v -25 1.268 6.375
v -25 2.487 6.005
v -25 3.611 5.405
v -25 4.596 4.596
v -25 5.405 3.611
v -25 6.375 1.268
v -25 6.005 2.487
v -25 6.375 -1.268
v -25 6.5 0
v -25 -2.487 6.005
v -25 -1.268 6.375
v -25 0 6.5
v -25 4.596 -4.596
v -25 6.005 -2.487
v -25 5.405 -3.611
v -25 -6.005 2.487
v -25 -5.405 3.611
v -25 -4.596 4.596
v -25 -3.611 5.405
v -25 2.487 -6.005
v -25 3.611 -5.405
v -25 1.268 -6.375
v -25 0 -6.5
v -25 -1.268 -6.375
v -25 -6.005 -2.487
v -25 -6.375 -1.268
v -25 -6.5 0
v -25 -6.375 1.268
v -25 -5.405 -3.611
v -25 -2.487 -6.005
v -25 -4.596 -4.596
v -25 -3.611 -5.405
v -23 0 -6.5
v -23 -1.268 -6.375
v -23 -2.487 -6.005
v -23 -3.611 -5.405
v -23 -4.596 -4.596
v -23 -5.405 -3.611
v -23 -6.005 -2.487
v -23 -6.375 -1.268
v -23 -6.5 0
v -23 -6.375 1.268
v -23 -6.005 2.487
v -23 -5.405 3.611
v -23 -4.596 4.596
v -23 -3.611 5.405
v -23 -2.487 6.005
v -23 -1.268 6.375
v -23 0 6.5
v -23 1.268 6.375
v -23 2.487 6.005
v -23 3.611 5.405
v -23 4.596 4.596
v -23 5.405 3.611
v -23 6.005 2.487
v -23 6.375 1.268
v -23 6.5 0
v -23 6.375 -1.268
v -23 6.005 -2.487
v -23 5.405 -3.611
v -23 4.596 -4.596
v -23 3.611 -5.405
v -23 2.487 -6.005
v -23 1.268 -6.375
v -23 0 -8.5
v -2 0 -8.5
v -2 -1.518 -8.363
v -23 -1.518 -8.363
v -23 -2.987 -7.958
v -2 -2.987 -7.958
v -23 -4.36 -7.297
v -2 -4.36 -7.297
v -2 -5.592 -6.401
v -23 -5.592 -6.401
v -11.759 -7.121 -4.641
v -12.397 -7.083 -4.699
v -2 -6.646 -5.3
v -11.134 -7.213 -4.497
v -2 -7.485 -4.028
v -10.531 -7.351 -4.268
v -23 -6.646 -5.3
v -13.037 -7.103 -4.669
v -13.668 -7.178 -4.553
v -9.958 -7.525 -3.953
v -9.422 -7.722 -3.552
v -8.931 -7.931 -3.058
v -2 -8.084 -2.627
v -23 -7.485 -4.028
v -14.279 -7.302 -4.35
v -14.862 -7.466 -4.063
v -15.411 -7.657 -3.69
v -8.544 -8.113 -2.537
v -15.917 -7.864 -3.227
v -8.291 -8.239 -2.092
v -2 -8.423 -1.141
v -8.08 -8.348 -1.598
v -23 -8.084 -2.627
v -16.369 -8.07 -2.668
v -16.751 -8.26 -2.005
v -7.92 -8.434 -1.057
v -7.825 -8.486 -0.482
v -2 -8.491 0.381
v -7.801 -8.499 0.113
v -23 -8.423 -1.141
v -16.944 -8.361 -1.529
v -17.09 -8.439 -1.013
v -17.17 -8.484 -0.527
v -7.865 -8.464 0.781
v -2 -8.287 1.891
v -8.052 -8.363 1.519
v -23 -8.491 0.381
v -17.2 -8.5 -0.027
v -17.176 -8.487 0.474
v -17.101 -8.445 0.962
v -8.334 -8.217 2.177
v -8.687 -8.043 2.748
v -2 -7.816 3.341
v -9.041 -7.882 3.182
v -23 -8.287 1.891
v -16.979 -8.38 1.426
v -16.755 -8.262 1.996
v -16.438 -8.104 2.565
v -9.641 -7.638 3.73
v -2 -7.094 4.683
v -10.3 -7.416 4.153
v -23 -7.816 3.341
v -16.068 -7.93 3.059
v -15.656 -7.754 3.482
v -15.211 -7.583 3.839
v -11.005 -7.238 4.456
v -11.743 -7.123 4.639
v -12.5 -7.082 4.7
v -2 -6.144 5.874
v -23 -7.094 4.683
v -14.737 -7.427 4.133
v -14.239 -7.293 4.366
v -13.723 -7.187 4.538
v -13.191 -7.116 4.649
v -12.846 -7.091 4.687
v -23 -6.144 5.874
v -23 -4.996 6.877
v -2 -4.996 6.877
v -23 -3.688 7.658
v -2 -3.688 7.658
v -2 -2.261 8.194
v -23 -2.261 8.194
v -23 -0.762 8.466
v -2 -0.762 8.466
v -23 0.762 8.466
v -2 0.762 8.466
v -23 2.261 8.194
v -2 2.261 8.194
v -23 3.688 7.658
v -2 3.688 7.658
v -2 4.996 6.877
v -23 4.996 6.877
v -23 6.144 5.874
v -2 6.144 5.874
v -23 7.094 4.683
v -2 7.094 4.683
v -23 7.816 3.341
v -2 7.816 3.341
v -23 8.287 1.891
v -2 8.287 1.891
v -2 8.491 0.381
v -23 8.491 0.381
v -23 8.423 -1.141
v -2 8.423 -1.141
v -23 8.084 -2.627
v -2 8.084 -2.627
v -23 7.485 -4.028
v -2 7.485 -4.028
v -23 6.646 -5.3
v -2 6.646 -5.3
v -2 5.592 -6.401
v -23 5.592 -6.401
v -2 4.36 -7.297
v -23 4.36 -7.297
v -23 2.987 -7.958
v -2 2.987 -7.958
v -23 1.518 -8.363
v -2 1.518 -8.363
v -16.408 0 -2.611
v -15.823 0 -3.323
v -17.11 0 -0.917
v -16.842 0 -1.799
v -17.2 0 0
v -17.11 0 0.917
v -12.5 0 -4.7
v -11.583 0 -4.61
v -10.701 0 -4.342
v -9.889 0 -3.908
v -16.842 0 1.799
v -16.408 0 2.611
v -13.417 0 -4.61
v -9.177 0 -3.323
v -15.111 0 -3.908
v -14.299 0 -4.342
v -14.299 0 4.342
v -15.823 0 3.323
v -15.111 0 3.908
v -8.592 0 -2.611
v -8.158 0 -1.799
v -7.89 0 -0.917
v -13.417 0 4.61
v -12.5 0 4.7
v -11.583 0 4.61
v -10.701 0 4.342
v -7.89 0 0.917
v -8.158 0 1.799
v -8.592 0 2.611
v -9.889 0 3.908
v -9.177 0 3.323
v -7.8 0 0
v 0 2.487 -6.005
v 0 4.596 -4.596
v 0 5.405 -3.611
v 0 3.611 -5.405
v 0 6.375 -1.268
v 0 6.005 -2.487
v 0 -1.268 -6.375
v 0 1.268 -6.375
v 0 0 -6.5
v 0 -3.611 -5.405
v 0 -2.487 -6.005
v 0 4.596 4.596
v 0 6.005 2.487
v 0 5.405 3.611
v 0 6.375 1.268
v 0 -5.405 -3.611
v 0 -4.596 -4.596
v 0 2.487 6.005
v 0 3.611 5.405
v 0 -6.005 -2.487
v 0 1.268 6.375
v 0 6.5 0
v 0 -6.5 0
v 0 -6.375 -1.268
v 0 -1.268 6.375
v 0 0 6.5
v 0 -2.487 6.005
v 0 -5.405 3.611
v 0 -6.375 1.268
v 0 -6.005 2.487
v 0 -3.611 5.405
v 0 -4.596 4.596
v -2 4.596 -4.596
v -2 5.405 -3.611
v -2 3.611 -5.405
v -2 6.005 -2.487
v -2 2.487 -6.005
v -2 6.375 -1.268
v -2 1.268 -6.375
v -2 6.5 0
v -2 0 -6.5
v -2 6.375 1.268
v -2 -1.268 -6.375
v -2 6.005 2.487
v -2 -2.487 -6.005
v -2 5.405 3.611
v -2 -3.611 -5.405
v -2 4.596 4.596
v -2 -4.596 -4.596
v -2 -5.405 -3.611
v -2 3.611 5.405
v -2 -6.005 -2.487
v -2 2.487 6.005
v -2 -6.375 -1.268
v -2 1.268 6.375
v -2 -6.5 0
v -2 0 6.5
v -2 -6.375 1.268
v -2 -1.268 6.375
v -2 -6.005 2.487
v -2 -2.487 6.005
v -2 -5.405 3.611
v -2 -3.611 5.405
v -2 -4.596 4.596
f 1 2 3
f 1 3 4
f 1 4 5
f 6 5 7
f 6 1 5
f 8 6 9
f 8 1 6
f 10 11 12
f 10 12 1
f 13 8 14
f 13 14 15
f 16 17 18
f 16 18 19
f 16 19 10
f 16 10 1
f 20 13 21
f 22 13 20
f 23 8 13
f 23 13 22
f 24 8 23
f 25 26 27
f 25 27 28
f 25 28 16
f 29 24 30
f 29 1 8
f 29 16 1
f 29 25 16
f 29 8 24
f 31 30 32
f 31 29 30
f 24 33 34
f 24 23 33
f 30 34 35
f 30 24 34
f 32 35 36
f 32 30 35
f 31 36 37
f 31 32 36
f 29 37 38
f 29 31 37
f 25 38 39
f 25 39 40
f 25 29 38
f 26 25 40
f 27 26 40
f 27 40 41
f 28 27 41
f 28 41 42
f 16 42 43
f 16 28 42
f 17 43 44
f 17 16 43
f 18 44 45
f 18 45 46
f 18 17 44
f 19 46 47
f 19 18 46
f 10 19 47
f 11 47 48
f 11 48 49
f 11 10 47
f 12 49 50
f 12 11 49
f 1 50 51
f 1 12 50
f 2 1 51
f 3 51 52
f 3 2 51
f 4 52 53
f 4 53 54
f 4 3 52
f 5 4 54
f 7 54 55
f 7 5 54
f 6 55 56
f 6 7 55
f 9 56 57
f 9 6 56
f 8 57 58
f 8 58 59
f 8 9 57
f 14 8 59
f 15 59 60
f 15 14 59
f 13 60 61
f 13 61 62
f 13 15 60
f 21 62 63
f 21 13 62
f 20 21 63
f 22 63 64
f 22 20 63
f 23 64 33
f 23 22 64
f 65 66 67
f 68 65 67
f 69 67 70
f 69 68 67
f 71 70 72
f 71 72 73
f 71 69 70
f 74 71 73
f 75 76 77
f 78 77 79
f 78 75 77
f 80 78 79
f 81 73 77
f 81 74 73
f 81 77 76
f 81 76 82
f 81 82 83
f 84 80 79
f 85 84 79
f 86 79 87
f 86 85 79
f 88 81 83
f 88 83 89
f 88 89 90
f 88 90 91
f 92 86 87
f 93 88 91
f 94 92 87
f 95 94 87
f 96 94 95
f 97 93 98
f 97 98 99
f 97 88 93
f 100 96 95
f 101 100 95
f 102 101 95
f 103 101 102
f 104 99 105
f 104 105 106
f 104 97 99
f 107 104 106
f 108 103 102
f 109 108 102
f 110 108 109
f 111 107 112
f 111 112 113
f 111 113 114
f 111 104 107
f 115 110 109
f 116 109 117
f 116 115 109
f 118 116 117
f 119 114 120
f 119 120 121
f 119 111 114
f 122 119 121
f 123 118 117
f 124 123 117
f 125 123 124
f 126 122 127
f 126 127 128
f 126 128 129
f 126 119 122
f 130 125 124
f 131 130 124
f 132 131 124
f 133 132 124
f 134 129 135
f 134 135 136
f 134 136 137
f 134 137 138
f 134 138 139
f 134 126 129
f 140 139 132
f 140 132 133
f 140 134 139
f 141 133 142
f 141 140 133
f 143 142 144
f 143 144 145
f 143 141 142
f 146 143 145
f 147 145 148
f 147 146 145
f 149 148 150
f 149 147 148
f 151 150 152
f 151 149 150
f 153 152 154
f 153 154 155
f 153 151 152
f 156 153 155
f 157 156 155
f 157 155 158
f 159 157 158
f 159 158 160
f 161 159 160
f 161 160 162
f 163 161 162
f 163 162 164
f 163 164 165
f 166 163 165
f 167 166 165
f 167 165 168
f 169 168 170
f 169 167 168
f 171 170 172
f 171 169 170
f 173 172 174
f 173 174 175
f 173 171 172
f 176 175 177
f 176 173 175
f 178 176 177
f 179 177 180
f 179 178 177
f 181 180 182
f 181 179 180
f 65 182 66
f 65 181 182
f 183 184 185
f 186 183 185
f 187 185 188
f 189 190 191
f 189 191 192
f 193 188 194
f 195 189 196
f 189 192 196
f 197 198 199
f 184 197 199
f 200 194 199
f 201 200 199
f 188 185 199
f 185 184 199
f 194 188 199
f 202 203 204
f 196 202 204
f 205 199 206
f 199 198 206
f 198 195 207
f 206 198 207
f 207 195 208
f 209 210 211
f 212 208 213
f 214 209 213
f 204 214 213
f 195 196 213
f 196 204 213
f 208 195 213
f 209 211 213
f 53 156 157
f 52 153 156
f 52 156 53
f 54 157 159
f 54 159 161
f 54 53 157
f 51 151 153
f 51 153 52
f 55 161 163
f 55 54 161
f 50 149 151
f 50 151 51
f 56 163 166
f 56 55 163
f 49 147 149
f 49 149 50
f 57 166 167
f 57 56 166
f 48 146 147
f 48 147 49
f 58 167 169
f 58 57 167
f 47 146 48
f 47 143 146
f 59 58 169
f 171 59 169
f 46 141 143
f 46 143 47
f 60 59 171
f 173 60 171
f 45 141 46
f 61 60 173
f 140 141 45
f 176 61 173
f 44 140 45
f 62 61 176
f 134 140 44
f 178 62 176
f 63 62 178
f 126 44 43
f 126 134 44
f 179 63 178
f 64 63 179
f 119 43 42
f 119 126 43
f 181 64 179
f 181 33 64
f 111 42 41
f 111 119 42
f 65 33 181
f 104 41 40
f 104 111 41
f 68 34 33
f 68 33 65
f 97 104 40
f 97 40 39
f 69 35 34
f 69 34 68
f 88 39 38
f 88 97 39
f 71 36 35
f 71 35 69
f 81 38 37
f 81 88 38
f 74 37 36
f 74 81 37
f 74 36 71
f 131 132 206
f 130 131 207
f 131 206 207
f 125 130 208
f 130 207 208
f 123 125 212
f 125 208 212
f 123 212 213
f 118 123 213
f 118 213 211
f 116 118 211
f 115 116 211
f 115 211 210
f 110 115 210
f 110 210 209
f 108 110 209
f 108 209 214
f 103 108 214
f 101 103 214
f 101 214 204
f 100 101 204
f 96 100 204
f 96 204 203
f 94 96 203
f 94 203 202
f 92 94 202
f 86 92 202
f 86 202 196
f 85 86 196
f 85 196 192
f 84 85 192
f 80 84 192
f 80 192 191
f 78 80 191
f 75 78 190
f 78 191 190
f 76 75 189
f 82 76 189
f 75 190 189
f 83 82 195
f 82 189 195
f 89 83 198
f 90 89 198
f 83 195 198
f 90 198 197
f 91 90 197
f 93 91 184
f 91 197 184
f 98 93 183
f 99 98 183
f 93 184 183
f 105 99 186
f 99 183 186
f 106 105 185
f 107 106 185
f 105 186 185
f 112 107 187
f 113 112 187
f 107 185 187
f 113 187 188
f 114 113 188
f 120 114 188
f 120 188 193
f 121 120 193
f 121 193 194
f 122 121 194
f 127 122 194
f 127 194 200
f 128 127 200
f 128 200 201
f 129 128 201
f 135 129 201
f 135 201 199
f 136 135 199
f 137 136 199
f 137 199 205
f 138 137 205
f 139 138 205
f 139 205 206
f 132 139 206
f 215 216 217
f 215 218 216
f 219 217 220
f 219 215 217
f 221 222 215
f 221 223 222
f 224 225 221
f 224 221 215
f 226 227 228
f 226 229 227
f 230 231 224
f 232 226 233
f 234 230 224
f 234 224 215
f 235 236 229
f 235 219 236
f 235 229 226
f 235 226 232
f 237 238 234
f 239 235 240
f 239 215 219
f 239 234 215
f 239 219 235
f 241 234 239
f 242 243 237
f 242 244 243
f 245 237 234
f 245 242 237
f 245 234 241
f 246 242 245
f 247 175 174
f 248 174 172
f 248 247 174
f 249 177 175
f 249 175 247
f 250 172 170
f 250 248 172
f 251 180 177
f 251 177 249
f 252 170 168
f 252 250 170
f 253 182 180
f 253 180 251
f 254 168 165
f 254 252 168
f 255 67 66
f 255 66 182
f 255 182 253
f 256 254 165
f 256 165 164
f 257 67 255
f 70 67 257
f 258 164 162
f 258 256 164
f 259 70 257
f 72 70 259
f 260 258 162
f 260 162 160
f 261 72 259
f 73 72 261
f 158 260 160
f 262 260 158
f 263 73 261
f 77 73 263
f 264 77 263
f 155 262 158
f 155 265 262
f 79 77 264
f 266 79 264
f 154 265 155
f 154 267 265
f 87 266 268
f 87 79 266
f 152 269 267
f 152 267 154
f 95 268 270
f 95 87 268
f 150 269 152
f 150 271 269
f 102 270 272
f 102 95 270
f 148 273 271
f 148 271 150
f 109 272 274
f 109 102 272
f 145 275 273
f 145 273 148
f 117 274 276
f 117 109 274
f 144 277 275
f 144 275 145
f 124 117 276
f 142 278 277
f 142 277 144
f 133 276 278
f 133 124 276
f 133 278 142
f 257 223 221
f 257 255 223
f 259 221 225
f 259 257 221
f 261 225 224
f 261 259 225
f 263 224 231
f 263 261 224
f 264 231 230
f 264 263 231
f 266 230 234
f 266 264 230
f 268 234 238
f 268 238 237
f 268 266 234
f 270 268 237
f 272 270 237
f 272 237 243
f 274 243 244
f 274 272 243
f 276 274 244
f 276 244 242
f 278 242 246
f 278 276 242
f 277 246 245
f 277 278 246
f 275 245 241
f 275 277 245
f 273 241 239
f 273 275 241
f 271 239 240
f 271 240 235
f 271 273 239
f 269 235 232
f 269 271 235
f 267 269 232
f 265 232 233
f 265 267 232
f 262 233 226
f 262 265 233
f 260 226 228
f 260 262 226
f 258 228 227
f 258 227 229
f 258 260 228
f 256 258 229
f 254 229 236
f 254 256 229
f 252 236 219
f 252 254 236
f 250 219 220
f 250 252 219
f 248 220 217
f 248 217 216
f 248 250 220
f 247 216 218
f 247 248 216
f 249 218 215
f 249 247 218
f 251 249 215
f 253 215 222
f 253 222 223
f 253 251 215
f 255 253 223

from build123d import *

# Parameters (mm, degrees)
ENL_V_MAT_EXTRU_1_REACH = 10.5
ESQUISSE2_R             = 4.7


with BuildPart() as part:
    # Esquisse1 → Révolution1 (revolve)
    with BuildSketch(Plane.XY, mode=Mode.PRIVATE) as r_volution1_sk:
        Polygon((-25, 0), (0, 0), (0, -6.5), (-2, -6.5), (-2, -8.5), (-23, -8.5), (-23, -6.5), (-25, -6.5), align=None)
    revolve(r_volution1_sk.sketch.rotate(Axis((35.066018426, 0, 0), (-1, 0, 0)), 270), axis=Axis((35.066018426, 0, 0), (-1, 0, 0)))  # turned: the seam where the file's is

    # Esquisse2 → Enlèv. mat.-Extru.1 (cut, up to next)
    with BuildSketch(Plane(origin=(0, 0, 0), x_dir=(1, 0, 0), z_dir=(0, 1, 0)), mode=Mode.PRIVATE) as enl_v_mat_extru_1_sk1:
        with Locations(Location((-12.5, 0, 0), (0, 0, 270))):  # turned: the seam where the file's is
            Circle(ESQUISSE2_R)
    enl_v_mat_extru_1_tool1 = extrude(enl_v_mat_extru_1_sk1.sketch, amount=-ENL_V_MAT_EXTRU_1_REACH, mode=Mode.PRIVATE) & part.part
    add(enl_v_mat_extru_1_tool1.solids().sort_by_distance((-12.5, 0, 0))[0], mode=Mode.SUBTRACT)


solid = part.part
